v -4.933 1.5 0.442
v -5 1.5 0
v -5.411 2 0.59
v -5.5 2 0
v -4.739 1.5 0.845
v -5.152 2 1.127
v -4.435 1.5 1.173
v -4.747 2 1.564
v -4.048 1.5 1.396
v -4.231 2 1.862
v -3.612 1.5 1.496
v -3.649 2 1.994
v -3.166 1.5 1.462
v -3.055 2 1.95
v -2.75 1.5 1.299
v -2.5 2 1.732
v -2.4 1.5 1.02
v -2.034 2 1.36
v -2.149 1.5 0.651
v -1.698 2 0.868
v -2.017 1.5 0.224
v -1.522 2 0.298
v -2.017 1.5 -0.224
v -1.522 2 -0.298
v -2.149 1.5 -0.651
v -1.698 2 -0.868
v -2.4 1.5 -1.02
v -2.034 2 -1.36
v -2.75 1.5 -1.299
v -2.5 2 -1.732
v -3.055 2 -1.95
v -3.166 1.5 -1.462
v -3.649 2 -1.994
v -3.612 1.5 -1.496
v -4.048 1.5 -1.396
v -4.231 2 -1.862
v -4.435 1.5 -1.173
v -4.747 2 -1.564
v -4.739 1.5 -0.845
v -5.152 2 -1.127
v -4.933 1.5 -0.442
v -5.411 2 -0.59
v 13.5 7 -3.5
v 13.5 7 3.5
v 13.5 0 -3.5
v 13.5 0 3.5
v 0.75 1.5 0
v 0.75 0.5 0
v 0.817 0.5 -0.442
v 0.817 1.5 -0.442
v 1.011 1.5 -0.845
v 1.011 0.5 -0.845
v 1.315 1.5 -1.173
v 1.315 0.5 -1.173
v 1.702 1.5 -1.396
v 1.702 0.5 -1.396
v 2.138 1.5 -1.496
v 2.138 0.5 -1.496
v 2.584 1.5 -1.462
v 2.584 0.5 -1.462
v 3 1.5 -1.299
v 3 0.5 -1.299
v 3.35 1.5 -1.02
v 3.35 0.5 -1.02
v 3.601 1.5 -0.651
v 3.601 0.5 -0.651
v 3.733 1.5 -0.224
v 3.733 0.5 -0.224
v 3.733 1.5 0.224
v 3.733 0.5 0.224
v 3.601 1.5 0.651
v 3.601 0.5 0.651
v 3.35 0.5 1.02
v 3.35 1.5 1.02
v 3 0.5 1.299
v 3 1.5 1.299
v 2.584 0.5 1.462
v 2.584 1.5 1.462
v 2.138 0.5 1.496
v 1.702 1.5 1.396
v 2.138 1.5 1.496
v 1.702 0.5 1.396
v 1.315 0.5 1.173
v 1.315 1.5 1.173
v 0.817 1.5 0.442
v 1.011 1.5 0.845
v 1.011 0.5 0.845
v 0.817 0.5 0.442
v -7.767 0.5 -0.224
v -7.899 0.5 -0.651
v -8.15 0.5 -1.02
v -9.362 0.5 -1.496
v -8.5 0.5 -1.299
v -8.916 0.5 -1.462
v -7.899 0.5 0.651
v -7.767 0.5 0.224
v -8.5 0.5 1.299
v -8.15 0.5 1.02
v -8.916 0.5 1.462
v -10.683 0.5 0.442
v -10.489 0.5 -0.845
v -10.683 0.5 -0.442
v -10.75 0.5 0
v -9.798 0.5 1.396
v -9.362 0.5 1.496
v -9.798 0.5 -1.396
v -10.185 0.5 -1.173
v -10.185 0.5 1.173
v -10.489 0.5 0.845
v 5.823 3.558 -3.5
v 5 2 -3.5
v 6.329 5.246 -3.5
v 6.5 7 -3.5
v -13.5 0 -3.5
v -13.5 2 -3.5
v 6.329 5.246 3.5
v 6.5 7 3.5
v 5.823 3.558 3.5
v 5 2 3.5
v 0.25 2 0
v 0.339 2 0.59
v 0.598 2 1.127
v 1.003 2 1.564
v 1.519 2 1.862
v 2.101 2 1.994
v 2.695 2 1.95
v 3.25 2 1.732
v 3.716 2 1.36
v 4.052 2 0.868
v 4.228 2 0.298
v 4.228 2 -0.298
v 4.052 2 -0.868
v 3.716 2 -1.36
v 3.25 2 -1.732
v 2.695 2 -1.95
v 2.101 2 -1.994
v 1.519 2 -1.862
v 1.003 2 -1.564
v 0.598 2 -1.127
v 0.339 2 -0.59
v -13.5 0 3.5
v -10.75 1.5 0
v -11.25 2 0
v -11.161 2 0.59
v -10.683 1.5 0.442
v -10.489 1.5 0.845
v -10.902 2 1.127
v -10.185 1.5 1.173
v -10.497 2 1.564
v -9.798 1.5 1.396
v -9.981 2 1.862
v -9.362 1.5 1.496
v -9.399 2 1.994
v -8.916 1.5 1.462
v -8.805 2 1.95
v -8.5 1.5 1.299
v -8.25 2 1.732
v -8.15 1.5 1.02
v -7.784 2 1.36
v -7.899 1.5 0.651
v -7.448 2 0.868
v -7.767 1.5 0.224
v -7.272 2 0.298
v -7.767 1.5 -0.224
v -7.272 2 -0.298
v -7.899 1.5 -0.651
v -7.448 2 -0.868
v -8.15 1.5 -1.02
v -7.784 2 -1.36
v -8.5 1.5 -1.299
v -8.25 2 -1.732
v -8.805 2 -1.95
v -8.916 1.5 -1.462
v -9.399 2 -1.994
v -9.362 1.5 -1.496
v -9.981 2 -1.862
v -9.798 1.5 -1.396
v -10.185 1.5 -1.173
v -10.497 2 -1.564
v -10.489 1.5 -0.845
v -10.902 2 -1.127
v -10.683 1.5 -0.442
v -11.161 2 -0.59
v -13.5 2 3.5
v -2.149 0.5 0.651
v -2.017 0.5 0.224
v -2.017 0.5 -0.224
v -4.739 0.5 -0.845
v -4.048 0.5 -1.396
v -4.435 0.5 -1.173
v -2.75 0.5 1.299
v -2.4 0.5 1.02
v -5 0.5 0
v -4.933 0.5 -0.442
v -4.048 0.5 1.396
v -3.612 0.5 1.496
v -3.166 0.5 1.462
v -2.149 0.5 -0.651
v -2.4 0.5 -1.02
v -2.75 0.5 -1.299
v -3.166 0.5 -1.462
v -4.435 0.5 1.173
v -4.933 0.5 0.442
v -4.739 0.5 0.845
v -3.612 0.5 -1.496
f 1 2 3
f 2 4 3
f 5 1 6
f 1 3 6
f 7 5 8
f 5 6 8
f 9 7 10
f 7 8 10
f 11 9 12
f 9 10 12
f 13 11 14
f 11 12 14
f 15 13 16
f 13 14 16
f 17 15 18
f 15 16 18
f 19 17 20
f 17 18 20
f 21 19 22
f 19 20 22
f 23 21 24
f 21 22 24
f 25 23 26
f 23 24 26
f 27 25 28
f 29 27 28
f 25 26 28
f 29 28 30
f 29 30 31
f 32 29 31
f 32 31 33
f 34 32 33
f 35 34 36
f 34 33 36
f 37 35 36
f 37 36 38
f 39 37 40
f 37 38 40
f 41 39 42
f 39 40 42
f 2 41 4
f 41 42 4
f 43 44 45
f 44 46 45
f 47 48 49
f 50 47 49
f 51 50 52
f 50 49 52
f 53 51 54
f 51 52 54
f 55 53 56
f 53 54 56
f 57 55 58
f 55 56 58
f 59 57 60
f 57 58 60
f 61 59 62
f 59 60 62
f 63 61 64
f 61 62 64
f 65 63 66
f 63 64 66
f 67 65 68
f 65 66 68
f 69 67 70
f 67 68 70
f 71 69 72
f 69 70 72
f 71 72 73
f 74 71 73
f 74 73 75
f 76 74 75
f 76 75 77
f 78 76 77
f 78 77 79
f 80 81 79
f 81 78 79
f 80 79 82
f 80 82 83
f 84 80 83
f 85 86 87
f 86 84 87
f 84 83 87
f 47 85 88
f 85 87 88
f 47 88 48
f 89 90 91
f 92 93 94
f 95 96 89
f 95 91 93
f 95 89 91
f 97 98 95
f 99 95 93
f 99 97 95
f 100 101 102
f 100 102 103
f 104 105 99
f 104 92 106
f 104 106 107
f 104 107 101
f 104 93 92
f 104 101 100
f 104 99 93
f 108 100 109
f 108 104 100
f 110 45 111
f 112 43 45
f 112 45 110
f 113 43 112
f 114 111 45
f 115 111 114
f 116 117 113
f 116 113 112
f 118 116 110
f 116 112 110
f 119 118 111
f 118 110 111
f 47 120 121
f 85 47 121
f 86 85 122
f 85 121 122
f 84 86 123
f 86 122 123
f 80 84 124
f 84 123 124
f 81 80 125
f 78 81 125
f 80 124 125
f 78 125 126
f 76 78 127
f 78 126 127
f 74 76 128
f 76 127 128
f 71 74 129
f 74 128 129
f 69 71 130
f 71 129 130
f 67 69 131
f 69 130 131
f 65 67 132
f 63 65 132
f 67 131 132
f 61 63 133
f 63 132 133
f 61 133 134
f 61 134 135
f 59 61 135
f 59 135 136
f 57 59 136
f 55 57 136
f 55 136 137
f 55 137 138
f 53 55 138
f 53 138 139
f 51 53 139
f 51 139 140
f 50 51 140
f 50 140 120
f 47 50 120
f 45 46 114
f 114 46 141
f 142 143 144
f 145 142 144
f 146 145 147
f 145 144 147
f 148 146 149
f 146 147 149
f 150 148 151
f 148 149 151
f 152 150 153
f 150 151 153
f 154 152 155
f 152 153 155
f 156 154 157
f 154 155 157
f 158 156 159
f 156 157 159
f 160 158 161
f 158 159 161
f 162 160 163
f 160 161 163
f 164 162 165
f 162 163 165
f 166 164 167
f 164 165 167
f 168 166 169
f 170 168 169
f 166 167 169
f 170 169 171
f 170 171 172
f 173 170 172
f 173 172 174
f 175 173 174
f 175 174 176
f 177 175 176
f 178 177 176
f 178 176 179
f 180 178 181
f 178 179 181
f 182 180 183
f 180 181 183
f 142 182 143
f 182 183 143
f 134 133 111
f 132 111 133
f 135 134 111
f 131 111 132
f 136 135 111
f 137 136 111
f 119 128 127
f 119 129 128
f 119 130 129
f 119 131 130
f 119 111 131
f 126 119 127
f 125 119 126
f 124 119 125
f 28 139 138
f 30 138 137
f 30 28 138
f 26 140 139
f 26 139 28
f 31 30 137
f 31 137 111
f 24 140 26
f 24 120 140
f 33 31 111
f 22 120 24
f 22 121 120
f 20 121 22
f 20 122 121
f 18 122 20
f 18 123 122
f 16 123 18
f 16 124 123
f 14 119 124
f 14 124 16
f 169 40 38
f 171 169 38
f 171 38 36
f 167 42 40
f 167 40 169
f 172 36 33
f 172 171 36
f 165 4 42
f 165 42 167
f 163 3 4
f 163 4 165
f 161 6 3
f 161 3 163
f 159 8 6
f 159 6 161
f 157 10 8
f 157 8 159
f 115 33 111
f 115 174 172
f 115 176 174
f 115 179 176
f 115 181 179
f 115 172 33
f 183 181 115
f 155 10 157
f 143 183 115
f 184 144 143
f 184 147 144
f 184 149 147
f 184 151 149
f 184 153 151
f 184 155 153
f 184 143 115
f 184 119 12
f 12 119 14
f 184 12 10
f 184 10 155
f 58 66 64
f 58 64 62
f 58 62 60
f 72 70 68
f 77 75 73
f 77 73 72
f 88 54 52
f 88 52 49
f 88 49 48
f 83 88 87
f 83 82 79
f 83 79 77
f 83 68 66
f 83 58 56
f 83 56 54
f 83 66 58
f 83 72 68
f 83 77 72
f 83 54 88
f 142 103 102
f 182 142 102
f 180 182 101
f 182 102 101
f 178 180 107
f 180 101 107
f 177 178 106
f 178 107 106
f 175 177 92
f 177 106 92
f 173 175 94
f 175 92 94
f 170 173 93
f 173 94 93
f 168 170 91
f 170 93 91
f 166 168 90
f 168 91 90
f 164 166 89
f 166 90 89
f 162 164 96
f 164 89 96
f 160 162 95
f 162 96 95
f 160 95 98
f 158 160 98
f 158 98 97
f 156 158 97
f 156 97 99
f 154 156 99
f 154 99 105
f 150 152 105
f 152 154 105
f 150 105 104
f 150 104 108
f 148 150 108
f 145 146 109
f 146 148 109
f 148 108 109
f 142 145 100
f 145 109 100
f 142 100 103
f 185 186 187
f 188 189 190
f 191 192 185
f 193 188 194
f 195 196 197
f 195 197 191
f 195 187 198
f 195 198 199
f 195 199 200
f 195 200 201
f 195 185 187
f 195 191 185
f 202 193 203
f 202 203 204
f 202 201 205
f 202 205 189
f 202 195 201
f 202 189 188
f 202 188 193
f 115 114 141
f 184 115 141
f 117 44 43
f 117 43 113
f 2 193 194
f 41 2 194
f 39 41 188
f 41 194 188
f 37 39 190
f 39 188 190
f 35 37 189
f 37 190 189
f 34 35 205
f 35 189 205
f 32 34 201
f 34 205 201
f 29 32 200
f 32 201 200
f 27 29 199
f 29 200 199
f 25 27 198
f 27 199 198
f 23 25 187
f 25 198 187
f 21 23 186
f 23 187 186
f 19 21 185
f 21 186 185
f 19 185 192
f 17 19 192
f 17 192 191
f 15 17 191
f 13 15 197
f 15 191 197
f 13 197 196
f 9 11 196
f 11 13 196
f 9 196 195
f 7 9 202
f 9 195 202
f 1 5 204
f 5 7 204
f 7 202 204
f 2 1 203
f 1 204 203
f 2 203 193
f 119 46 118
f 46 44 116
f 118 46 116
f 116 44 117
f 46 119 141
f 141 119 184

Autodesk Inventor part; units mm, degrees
ref_plane "YZ Plane" through (0, 0, 0) normal (1, 0, 0) x (0, 1, 0)
ref_plane "XZ Plane" through (0, 0, 0) normal (0, 1, 0) x (-1, 0, 0)
ref_plane "XY Plane" through (0, 0, 0) normal (0, 0, 1) x (1, 0, 0)
sketch "Sketch1" plane through (0, 0, 0) normal (0, 1, 0) x (-1, 0, 0)
  line L0 (-13.5, -3.5) -> (13.5, -3.5)
  line L1 (13.5, -3.5) -> (13.5, 3.5)
  line L2 (13.5, 3.5) -> (-13.5, 3.5)
  line L3 (-13.5, 3.5) -> (-13.5, -3.5)
  line L4 (-13.5, -3.5) -> (13.5, 3.5) construction
  line L5 (13.5, -3.5) -> (-13.5, 3.5) construction
  line L6 (-6.5, 3.5) -> (-6.5, -3.5)
  line L7 (-6.5, 0) -> (13.5, 0) construction
  circle A0 centre (9.25, 0) radius 1.5
  circle A1 centre (3.5, 0) radius 1.5
  circle A2 centre (-2.25, 0) radius 1.5
  point P0 (0, 0)
  dimension "d0" = 27
  dimension "d1" = 7
  dimension "d2" = 7
  dimension "d3" = 3
  dimension "d6" = 3
  dimension "d11" = 3
  dimension "d19" = 5.75
  dimension "d20" = 5.75
  dimension "d21" = 4.25
  dimension "d22" = 4.25
extrude "Extrusion1" add sketch "Sketch1" along normal blind 7 contours L3 L2 L6 L0
extrude "Extrusion2" add sketch "Sketch1" along normal blind 2 contours L6 L2 L1 L0
extrude "Extrusion3" add sketch "Sketch1" along normal blind 0.5 contours A0 | A1 | A2
chamfer "Chamfer1" distance 0.5 angle 45 3 edges at (3.75, 2, 0) (-2, 2, 0) (-7.75, 2, 0)
sketch "Sketch2" plane through (13.5, 7, -3.5) normal (0, 0, -1) x (-1, 0, 0)
  line L0 (0, -7) -> (27, -7) projected
  line L1 (27, -7) -> (27, -5) projected
  line L2 (7, -5) -> (27, -5) projected
  line L3 (7, -5) -> (7, 0) projected
  line L4 (0, 0) -> (7, 0) projected
  line L5 (0, -7) -> (0, 0) projected
  arc A0 (7, 0) -> (8.5, -5) centre (16.0833, 0) ccw
  point P0 (13.5, -7)
  dimension "d32" = 1.5
extrude "Extrusion4" add sketch "Sketch2" against normal up to surface (7 mm away) contours A0 L2 L3
equation "\"d20\" = d19"
equation "\"d21\" = d19 - 0.5 * d11"
equation "\"d22\" = d19 - 0.5 * d3"
properties part number "glue_test_flex"
